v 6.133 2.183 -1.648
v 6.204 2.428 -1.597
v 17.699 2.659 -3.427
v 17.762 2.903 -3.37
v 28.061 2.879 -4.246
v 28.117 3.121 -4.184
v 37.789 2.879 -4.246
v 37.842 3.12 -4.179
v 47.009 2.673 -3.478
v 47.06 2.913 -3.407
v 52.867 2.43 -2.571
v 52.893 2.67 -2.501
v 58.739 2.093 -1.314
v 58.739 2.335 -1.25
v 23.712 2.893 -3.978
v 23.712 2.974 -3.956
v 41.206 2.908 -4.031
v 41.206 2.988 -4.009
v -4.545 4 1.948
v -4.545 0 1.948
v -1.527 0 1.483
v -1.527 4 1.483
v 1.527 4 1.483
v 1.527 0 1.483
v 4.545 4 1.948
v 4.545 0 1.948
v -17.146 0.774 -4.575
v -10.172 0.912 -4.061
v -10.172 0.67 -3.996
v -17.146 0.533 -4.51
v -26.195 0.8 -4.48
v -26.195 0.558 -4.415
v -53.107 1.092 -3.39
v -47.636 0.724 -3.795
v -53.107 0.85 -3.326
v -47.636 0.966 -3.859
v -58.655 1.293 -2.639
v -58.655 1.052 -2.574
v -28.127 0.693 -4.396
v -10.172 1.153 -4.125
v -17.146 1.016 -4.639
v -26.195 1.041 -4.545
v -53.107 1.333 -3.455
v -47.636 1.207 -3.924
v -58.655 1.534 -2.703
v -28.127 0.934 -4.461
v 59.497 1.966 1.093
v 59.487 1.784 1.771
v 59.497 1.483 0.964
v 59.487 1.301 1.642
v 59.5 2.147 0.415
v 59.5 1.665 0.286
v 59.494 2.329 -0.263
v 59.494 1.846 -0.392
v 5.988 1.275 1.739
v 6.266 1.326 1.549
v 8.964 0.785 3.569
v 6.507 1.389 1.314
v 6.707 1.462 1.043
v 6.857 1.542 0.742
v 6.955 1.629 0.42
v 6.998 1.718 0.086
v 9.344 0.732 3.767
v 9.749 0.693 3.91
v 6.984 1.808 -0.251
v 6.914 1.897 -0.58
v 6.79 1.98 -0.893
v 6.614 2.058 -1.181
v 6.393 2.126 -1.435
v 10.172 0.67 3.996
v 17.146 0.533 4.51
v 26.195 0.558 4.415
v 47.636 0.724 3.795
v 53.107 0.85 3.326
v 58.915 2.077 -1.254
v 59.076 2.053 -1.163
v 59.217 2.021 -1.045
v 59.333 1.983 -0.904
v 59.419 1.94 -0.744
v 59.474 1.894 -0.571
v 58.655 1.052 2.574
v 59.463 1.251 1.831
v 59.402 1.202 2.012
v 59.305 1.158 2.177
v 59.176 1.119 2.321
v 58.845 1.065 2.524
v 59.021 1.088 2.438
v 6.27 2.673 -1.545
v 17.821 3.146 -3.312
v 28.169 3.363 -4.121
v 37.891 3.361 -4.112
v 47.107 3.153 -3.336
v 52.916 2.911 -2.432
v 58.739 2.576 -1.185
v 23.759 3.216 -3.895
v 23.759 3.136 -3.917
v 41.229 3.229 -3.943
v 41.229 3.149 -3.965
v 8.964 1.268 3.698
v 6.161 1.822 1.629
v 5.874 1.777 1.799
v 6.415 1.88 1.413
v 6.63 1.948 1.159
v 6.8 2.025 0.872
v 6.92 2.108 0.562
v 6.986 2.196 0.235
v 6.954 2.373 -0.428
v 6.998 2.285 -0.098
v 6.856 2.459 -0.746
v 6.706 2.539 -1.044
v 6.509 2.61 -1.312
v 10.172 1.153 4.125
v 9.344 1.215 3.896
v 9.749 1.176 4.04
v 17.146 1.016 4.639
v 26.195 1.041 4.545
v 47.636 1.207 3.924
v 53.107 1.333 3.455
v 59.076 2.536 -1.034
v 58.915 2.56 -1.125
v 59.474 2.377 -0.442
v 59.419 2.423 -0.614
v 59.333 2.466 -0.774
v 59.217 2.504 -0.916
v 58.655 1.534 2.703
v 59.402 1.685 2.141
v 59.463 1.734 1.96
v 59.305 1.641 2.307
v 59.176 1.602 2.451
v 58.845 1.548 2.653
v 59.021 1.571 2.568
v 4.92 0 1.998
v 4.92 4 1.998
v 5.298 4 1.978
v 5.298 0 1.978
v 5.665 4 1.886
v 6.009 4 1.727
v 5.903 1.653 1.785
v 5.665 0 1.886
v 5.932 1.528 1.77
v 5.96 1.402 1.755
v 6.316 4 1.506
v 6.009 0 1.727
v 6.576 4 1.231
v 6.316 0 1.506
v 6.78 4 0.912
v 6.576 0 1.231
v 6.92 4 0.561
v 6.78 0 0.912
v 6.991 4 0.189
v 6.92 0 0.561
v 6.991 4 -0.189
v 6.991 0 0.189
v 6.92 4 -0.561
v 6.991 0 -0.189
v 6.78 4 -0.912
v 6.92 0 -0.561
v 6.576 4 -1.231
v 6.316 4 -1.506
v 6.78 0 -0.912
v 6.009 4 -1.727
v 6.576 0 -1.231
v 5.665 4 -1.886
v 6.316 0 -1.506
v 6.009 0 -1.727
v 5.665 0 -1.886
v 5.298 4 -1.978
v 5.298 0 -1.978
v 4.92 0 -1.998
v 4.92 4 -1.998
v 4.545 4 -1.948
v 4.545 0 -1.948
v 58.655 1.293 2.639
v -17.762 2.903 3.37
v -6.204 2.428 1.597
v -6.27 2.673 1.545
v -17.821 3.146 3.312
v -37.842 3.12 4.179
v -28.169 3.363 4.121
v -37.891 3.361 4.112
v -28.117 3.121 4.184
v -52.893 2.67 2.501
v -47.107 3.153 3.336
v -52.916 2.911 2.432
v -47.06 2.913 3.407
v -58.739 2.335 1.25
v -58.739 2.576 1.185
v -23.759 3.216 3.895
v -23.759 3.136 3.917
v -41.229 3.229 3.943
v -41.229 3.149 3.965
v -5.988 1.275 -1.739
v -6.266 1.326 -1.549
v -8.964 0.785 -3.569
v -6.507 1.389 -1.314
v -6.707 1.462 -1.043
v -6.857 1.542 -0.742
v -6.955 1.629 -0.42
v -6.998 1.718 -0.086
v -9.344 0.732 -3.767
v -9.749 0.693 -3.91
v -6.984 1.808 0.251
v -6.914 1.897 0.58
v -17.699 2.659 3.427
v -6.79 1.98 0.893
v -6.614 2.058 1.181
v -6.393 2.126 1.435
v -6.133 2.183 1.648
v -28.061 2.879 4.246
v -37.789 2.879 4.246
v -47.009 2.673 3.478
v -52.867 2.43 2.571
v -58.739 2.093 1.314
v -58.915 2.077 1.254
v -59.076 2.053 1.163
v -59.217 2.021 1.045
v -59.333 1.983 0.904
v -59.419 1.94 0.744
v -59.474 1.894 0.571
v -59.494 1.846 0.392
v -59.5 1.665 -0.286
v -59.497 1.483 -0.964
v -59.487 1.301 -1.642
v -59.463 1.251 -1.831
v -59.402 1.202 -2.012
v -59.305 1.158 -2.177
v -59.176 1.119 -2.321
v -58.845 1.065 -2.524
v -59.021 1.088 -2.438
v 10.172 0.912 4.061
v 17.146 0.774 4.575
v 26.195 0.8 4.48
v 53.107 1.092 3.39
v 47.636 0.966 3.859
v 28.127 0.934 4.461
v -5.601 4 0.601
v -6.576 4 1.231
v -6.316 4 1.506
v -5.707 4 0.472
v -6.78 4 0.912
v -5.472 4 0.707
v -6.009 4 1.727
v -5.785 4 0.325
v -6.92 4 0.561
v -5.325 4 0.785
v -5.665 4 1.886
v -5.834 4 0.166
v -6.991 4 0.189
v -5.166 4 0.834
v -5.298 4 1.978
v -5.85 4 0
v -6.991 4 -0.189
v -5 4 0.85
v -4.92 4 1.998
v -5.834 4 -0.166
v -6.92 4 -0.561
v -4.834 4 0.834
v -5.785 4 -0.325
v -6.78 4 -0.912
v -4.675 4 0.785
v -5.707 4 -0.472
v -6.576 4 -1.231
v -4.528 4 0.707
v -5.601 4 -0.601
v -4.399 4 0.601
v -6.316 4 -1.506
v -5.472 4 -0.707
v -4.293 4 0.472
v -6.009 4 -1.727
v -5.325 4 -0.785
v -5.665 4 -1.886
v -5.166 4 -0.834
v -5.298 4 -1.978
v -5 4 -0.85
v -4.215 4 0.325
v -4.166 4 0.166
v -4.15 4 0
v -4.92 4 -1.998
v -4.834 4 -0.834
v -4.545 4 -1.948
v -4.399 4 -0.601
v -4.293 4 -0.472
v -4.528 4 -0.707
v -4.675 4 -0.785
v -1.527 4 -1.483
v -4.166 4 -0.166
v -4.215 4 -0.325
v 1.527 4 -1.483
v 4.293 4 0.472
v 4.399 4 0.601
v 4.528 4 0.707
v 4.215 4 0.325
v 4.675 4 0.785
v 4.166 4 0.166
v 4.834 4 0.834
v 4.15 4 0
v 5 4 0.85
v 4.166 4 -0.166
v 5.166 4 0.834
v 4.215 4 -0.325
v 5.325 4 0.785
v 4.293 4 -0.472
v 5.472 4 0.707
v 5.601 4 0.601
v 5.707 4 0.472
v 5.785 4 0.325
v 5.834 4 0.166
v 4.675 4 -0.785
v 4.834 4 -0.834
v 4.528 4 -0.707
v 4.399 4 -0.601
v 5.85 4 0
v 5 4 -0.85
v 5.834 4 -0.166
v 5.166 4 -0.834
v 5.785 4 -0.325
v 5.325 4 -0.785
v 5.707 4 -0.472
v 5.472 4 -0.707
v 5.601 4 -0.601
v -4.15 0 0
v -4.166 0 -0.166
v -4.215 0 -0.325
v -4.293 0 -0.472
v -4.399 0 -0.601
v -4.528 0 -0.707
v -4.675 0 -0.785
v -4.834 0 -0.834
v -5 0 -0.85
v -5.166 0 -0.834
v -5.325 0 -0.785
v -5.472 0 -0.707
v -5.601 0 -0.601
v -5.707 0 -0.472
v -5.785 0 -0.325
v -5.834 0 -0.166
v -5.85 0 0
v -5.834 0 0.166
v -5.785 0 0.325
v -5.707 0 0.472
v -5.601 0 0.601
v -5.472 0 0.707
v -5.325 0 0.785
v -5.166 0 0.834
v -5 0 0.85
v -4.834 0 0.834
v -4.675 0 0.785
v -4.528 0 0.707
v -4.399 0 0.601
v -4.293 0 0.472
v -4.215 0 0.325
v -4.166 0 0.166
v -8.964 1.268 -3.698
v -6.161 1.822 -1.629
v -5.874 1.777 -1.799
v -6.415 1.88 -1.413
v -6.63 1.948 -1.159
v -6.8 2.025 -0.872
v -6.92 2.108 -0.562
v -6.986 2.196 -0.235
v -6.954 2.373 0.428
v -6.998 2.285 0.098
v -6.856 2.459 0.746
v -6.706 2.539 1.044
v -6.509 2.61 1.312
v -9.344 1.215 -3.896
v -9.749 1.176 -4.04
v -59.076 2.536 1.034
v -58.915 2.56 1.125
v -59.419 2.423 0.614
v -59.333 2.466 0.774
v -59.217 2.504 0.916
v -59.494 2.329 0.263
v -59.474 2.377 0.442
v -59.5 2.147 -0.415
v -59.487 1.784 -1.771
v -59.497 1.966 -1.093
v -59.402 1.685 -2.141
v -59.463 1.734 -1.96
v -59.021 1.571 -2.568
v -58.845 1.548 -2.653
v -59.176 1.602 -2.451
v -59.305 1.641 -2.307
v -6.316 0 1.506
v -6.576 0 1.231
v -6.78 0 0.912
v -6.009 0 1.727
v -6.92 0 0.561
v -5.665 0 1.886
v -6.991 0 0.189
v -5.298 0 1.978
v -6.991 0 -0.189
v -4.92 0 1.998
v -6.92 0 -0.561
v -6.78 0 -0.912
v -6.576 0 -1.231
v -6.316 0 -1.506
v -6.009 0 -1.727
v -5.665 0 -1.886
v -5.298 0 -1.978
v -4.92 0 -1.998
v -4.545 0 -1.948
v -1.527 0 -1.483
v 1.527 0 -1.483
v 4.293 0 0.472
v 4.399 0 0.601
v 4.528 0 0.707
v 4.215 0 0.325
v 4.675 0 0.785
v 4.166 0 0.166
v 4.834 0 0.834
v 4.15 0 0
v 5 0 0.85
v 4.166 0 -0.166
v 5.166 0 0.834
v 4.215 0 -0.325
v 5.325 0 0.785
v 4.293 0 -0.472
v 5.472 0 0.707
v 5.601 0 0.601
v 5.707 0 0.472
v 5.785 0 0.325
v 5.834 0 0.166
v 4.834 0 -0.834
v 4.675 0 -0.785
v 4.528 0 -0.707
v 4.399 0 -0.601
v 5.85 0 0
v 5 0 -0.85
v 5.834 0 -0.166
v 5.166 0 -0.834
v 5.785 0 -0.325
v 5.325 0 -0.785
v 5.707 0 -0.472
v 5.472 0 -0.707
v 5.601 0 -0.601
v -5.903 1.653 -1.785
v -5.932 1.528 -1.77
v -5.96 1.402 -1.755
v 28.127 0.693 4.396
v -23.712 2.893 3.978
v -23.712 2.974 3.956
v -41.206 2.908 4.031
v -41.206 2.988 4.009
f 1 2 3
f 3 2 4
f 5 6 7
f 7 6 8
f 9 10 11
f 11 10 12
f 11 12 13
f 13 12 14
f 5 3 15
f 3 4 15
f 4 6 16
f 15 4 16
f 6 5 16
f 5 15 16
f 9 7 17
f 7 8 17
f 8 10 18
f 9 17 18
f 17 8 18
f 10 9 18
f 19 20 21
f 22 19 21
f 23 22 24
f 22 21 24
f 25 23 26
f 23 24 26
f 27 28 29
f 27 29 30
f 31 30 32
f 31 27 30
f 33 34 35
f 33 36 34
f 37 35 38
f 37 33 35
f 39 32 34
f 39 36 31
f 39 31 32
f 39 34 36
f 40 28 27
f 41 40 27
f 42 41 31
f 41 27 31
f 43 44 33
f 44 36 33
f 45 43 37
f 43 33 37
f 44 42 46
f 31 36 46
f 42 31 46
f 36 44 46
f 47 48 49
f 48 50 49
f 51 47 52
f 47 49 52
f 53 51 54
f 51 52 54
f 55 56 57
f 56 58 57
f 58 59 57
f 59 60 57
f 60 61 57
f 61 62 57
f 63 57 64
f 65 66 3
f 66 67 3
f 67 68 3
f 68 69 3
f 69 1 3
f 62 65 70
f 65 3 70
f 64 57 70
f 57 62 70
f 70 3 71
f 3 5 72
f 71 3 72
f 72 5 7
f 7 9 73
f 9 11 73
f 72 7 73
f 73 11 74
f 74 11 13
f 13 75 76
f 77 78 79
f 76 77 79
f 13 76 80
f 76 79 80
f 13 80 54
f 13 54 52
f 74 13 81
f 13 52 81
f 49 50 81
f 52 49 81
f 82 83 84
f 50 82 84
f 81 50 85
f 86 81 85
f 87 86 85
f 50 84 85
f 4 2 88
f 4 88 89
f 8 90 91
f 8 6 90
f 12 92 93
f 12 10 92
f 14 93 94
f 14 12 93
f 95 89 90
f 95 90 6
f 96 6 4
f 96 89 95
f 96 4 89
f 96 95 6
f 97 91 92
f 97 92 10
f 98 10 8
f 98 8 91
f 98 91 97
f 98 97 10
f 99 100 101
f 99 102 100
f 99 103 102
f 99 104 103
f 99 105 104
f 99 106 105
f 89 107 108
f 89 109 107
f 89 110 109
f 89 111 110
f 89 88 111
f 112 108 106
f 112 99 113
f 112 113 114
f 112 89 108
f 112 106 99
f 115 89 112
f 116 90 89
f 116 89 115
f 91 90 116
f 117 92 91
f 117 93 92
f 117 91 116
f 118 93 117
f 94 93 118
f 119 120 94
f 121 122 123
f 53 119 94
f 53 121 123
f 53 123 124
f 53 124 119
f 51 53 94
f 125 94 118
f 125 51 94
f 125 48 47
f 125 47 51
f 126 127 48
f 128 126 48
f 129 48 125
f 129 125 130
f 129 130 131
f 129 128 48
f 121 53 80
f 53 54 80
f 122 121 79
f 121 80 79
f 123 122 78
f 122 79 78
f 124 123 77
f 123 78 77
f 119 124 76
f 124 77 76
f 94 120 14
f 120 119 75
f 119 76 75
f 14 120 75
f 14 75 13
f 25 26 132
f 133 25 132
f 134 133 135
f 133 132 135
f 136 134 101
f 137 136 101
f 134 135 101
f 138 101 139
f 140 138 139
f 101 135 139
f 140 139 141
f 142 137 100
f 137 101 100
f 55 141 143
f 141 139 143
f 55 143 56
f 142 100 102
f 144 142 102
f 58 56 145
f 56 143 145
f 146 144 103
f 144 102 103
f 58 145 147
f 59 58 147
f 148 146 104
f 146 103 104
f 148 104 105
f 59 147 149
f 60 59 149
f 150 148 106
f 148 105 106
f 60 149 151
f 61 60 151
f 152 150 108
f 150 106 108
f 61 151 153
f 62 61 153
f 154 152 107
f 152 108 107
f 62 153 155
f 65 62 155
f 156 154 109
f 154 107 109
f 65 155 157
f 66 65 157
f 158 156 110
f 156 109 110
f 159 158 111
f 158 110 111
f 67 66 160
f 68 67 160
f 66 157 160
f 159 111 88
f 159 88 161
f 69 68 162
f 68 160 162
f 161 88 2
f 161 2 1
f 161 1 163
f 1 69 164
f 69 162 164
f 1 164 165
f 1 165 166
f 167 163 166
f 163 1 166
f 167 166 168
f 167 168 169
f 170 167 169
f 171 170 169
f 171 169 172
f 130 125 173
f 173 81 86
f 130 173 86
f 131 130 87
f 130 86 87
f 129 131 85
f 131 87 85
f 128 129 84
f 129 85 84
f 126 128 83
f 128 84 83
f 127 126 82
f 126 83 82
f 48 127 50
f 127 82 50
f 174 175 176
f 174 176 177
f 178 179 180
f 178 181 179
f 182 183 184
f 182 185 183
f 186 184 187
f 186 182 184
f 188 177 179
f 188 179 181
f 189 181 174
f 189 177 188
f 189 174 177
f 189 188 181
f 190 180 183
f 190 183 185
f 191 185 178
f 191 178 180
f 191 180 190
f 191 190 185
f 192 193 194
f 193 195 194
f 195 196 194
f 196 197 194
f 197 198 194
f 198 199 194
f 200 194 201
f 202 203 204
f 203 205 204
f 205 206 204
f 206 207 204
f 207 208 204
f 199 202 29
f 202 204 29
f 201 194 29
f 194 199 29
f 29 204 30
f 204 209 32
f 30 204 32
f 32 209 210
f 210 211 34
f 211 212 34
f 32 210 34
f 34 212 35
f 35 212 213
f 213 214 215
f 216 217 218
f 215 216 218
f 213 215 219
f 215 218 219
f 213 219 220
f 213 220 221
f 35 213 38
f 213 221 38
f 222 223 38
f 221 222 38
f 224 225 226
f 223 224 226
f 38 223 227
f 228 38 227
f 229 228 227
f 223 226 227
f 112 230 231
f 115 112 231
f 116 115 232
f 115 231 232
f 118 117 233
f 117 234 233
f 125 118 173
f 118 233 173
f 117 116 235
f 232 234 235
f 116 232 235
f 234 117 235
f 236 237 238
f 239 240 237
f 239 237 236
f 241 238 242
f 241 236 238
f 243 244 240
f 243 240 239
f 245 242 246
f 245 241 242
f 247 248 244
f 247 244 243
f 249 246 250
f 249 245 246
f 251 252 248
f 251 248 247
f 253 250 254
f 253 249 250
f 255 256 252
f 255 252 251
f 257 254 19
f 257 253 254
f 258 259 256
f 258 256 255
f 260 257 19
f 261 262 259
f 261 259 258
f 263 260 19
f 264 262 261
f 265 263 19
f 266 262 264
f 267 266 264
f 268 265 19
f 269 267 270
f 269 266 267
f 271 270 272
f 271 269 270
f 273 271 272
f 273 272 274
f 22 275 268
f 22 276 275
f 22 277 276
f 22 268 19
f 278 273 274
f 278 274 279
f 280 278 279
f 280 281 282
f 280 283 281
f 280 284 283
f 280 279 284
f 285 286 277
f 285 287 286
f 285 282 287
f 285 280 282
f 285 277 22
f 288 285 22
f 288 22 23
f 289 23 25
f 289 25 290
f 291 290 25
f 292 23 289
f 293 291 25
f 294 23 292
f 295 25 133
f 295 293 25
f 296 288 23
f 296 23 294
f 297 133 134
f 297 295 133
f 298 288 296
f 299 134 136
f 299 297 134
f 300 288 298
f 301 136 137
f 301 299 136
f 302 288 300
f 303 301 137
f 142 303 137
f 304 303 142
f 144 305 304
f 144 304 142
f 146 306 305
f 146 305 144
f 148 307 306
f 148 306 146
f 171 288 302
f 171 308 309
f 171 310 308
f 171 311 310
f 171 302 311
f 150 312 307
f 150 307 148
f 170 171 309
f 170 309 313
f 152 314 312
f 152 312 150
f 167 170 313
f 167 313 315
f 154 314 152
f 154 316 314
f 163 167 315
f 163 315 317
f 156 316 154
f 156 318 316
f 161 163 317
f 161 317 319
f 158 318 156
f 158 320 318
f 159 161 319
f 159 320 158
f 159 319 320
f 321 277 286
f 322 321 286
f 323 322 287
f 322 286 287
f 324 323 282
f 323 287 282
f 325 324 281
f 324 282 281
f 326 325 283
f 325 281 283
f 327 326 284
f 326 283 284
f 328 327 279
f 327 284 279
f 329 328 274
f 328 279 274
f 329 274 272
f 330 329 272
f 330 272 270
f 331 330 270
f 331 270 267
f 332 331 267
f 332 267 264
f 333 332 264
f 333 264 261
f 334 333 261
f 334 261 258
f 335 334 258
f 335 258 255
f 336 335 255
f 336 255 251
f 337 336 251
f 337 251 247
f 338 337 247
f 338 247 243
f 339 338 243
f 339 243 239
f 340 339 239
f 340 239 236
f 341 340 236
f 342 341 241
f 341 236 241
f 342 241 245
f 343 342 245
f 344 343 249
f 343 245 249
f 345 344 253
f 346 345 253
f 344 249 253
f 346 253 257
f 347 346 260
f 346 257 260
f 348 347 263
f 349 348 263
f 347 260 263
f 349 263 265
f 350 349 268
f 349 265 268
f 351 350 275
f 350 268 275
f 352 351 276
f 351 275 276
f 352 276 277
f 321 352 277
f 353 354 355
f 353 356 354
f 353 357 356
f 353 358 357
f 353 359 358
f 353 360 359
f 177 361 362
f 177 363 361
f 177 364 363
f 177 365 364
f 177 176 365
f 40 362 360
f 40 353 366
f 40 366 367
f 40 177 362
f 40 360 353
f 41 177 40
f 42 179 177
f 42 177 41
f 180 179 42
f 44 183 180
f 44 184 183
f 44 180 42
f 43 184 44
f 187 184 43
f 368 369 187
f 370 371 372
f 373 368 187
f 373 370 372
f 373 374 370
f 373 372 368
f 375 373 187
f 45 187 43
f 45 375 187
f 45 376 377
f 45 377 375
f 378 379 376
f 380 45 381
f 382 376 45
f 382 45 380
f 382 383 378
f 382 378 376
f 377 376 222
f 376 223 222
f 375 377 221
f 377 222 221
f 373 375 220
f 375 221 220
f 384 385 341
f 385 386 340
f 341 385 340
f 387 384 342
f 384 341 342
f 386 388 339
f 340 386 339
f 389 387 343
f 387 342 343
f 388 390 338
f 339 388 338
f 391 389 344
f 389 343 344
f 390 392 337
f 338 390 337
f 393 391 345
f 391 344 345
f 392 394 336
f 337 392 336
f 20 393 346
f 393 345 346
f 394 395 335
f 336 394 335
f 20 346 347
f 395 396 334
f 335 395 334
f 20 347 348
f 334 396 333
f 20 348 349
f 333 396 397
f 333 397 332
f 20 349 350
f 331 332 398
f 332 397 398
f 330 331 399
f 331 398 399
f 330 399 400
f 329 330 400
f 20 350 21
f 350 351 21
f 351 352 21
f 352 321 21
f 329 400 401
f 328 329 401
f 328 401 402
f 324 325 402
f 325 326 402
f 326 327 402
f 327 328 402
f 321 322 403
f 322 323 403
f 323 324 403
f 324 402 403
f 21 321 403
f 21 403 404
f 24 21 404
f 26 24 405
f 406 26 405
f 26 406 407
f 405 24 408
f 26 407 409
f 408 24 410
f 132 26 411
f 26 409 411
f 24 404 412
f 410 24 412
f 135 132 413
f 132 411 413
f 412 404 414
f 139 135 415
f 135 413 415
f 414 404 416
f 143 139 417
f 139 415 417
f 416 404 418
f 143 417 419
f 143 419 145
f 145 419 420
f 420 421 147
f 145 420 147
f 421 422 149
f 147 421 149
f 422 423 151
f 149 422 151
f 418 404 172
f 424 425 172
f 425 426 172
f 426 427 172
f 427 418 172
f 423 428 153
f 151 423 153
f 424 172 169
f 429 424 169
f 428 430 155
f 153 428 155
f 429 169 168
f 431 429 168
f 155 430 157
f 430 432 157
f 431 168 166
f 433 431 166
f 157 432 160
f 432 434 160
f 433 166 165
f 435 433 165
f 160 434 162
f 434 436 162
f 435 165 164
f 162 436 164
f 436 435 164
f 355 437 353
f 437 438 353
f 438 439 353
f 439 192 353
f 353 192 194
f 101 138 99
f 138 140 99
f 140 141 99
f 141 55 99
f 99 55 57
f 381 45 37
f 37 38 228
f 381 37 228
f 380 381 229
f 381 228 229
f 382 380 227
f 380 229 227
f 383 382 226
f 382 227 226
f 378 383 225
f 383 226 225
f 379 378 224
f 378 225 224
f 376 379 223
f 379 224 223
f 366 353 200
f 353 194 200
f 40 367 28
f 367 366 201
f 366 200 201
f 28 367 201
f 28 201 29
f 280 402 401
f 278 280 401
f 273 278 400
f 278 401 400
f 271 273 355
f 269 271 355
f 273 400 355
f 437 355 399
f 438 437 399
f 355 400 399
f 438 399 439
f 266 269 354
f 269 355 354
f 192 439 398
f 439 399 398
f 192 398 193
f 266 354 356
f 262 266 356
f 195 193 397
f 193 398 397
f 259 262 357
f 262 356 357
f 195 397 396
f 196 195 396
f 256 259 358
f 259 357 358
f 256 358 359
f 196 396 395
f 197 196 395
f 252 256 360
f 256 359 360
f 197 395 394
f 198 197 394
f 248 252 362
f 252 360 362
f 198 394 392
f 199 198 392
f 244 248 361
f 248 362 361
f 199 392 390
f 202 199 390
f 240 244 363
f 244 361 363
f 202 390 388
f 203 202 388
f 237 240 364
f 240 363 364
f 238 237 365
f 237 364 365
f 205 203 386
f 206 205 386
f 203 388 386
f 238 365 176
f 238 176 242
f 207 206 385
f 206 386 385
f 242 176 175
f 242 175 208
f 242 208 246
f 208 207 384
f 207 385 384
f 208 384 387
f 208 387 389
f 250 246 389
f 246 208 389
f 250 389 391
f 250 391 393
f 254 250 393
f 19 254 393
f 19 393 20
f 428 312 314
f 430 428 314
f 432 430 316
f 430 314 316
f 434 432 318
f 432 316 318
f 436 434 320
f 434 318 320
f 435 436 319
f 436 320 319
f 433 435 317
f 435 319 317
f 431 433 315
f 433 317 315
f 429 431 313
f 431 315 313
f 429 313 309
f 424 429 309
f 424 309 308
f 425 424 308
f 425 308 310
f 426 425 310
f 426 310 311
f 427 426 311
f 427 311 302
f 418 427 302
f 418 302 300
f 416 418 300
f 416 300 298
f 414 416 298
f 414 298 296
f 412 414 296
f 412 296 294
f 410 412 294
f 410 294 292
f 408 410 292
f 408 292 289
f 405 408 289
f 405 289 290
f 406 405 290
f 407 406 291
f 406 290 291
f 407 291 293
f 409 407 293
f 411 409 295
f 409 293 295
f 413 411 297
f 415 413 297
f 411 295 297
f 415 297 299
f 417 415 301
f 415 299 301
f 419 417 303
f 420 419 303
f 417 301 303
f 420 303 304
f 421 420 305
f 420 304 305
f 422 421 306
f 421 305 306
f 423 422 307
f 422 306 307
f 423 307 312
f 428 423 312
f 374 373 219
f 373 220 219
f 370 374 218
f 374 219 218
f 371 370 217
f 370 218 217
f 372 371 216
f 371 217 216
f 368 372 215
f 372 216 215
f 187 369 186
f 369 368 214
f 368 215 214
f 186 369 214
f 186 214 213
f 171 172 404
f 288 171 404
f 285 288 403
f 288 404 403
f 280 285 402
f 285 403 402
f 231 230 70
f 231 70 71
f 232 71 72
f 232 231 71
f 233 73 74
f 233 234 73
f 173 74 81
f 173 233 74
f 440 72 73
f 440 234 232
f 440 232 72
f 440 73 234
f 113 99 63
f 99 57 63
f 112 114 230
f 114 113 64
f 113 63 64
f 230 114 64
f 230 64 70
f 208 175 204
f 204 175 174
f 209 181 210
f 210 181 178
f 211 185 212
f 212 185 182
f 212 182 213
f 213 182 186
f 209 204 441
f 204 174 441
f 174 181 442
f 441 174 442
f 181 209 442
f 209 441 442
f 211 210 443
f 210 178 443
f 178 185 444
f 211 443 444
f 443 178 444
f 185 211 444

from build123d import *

# Parameters (mm, degrees)
EXTRUDE_1_DEPTH          = 4
EXTRUDE_2_DEPTH          = 0.25
PATTERN_CIRCULAR_1_COUNT = 2
SKETCH_4_R               = 0.85
CUT_EXTRUDE_1_DEPTH      = 5.0000001


with BuildPart() as part:
    # 草图1 → 凸台-拉伸1 (new body)
    with BuildSketch(Plane(origin=(0, 0, 0), x_dir=(1, 0, 0), z_dir=(0, 1, 0))):
        with BuildLine():
            ThreePointArc((4.545454545, 1.947662299), (0, 1.424285286), (-4.545454545, 1.947662299))
            ThreePointArc((-4.545454545, 1.947662299), (-7, 0), (-4.545454545, -1.947662299))
            ThreePointArc((-4.545454545, -1.947662299), (0, -1.424285286), (4.545454545, -1.947662299))
            ThreePointArc((4.545454545, -1.947662299), (7, 0), (4.545454545, 1.947662299))
        make_face()
    extrude(amount=EXTRUDE_1_DEPTH)

    # 草图3 → 凸台-拉伸2 (add, symmetric)
    with BuildSketch(Plane(origin=(0, 1.866025404, 0.5), x_dir=(0, 0.258819045, -0.965925826), z_dir=(0, -0.965925826, -0.258819045))):
        with BuildLine():
            Line((-0.721025856, 5), (-3.244156646, 8.963824719))
            ThreePointArc((-3.244156646, 8.963824719), (-3.530742288, 9.544023278), (-3.686238371, 10.172181433))
            add(Edge.make_bspline(
                [(-3.686238371, 10.172181433), (-4.525441011, 16.369200543), (-3.695143097, 32.261586596), (-4.002824546, 48.145456087), (-2.214031519, 58.654900349)],
                knots=[0.01661138, 0.01661138, 0.01661138, 0.01661138, 0.374640407, 0.984355774, 0.984355774, 0.984355774, 0.984355774], degree=3))
            ThreePointArc((-2.214031519, 58.654900349), (-1.881256083, 59.24442325), (-1.249204631, 59.486885007))
            ThreePointArc((-1.249204631, 59.486885007), (-0.196436424, 59.499675736), (0.85639329, 59.493836576))
            ThreePointArc((0.85639329, 59.493836576), (1.46199409, 59.278546742), (1.811474117, 58.739134328))
            add(Edge.make_bspline(
                [(1.931851653, 5), (5.579965015, 23.055167147), (6.356652938, 40.76793724), (1.811474117, 58.739134328)],
                knots=[0, 0, 0, 0, 0.986483201, 0.986483201, 0.986483201, 0.986483201], degree=3))
            Line((1.931851653, 5), (-0.721025856, 5))
        make_face()
    extrude_2 = extrude(amount=EXTRUDE_2_DEPTH, both=True)

    # 阵列(圆周)1: 凸台-拉伸2 ×2 about axis
    pattern_circular_1_axis = Axis((0, 4.2, 0), (0, -1, 0))
    for i in range(1, PATTERN_CIRCULAR_1_COUNT):
        add(extrude_2.rotate(pattern_circular_1_axis, i * 360 / PATTERN_CIRCULAR_1_COUNT))

    # 草图4 → 切除-拉伸1 (cut, through all)
    with BuildSketch(Plane(origin=(0, 4, 0), x_dir=(1, 0, 0), z_dir=(0, 1, 0))):
        with Locations((-5, 0)):
            Circle(SKETCH_4_R)
        with Locations((5, 0)):
            Circle(SKETCH_4_R)
    extrude(amount=-CUT_EXTRUDE_1_DEPTH, mode=Mode.SUBTRACT)


solid = part.part
